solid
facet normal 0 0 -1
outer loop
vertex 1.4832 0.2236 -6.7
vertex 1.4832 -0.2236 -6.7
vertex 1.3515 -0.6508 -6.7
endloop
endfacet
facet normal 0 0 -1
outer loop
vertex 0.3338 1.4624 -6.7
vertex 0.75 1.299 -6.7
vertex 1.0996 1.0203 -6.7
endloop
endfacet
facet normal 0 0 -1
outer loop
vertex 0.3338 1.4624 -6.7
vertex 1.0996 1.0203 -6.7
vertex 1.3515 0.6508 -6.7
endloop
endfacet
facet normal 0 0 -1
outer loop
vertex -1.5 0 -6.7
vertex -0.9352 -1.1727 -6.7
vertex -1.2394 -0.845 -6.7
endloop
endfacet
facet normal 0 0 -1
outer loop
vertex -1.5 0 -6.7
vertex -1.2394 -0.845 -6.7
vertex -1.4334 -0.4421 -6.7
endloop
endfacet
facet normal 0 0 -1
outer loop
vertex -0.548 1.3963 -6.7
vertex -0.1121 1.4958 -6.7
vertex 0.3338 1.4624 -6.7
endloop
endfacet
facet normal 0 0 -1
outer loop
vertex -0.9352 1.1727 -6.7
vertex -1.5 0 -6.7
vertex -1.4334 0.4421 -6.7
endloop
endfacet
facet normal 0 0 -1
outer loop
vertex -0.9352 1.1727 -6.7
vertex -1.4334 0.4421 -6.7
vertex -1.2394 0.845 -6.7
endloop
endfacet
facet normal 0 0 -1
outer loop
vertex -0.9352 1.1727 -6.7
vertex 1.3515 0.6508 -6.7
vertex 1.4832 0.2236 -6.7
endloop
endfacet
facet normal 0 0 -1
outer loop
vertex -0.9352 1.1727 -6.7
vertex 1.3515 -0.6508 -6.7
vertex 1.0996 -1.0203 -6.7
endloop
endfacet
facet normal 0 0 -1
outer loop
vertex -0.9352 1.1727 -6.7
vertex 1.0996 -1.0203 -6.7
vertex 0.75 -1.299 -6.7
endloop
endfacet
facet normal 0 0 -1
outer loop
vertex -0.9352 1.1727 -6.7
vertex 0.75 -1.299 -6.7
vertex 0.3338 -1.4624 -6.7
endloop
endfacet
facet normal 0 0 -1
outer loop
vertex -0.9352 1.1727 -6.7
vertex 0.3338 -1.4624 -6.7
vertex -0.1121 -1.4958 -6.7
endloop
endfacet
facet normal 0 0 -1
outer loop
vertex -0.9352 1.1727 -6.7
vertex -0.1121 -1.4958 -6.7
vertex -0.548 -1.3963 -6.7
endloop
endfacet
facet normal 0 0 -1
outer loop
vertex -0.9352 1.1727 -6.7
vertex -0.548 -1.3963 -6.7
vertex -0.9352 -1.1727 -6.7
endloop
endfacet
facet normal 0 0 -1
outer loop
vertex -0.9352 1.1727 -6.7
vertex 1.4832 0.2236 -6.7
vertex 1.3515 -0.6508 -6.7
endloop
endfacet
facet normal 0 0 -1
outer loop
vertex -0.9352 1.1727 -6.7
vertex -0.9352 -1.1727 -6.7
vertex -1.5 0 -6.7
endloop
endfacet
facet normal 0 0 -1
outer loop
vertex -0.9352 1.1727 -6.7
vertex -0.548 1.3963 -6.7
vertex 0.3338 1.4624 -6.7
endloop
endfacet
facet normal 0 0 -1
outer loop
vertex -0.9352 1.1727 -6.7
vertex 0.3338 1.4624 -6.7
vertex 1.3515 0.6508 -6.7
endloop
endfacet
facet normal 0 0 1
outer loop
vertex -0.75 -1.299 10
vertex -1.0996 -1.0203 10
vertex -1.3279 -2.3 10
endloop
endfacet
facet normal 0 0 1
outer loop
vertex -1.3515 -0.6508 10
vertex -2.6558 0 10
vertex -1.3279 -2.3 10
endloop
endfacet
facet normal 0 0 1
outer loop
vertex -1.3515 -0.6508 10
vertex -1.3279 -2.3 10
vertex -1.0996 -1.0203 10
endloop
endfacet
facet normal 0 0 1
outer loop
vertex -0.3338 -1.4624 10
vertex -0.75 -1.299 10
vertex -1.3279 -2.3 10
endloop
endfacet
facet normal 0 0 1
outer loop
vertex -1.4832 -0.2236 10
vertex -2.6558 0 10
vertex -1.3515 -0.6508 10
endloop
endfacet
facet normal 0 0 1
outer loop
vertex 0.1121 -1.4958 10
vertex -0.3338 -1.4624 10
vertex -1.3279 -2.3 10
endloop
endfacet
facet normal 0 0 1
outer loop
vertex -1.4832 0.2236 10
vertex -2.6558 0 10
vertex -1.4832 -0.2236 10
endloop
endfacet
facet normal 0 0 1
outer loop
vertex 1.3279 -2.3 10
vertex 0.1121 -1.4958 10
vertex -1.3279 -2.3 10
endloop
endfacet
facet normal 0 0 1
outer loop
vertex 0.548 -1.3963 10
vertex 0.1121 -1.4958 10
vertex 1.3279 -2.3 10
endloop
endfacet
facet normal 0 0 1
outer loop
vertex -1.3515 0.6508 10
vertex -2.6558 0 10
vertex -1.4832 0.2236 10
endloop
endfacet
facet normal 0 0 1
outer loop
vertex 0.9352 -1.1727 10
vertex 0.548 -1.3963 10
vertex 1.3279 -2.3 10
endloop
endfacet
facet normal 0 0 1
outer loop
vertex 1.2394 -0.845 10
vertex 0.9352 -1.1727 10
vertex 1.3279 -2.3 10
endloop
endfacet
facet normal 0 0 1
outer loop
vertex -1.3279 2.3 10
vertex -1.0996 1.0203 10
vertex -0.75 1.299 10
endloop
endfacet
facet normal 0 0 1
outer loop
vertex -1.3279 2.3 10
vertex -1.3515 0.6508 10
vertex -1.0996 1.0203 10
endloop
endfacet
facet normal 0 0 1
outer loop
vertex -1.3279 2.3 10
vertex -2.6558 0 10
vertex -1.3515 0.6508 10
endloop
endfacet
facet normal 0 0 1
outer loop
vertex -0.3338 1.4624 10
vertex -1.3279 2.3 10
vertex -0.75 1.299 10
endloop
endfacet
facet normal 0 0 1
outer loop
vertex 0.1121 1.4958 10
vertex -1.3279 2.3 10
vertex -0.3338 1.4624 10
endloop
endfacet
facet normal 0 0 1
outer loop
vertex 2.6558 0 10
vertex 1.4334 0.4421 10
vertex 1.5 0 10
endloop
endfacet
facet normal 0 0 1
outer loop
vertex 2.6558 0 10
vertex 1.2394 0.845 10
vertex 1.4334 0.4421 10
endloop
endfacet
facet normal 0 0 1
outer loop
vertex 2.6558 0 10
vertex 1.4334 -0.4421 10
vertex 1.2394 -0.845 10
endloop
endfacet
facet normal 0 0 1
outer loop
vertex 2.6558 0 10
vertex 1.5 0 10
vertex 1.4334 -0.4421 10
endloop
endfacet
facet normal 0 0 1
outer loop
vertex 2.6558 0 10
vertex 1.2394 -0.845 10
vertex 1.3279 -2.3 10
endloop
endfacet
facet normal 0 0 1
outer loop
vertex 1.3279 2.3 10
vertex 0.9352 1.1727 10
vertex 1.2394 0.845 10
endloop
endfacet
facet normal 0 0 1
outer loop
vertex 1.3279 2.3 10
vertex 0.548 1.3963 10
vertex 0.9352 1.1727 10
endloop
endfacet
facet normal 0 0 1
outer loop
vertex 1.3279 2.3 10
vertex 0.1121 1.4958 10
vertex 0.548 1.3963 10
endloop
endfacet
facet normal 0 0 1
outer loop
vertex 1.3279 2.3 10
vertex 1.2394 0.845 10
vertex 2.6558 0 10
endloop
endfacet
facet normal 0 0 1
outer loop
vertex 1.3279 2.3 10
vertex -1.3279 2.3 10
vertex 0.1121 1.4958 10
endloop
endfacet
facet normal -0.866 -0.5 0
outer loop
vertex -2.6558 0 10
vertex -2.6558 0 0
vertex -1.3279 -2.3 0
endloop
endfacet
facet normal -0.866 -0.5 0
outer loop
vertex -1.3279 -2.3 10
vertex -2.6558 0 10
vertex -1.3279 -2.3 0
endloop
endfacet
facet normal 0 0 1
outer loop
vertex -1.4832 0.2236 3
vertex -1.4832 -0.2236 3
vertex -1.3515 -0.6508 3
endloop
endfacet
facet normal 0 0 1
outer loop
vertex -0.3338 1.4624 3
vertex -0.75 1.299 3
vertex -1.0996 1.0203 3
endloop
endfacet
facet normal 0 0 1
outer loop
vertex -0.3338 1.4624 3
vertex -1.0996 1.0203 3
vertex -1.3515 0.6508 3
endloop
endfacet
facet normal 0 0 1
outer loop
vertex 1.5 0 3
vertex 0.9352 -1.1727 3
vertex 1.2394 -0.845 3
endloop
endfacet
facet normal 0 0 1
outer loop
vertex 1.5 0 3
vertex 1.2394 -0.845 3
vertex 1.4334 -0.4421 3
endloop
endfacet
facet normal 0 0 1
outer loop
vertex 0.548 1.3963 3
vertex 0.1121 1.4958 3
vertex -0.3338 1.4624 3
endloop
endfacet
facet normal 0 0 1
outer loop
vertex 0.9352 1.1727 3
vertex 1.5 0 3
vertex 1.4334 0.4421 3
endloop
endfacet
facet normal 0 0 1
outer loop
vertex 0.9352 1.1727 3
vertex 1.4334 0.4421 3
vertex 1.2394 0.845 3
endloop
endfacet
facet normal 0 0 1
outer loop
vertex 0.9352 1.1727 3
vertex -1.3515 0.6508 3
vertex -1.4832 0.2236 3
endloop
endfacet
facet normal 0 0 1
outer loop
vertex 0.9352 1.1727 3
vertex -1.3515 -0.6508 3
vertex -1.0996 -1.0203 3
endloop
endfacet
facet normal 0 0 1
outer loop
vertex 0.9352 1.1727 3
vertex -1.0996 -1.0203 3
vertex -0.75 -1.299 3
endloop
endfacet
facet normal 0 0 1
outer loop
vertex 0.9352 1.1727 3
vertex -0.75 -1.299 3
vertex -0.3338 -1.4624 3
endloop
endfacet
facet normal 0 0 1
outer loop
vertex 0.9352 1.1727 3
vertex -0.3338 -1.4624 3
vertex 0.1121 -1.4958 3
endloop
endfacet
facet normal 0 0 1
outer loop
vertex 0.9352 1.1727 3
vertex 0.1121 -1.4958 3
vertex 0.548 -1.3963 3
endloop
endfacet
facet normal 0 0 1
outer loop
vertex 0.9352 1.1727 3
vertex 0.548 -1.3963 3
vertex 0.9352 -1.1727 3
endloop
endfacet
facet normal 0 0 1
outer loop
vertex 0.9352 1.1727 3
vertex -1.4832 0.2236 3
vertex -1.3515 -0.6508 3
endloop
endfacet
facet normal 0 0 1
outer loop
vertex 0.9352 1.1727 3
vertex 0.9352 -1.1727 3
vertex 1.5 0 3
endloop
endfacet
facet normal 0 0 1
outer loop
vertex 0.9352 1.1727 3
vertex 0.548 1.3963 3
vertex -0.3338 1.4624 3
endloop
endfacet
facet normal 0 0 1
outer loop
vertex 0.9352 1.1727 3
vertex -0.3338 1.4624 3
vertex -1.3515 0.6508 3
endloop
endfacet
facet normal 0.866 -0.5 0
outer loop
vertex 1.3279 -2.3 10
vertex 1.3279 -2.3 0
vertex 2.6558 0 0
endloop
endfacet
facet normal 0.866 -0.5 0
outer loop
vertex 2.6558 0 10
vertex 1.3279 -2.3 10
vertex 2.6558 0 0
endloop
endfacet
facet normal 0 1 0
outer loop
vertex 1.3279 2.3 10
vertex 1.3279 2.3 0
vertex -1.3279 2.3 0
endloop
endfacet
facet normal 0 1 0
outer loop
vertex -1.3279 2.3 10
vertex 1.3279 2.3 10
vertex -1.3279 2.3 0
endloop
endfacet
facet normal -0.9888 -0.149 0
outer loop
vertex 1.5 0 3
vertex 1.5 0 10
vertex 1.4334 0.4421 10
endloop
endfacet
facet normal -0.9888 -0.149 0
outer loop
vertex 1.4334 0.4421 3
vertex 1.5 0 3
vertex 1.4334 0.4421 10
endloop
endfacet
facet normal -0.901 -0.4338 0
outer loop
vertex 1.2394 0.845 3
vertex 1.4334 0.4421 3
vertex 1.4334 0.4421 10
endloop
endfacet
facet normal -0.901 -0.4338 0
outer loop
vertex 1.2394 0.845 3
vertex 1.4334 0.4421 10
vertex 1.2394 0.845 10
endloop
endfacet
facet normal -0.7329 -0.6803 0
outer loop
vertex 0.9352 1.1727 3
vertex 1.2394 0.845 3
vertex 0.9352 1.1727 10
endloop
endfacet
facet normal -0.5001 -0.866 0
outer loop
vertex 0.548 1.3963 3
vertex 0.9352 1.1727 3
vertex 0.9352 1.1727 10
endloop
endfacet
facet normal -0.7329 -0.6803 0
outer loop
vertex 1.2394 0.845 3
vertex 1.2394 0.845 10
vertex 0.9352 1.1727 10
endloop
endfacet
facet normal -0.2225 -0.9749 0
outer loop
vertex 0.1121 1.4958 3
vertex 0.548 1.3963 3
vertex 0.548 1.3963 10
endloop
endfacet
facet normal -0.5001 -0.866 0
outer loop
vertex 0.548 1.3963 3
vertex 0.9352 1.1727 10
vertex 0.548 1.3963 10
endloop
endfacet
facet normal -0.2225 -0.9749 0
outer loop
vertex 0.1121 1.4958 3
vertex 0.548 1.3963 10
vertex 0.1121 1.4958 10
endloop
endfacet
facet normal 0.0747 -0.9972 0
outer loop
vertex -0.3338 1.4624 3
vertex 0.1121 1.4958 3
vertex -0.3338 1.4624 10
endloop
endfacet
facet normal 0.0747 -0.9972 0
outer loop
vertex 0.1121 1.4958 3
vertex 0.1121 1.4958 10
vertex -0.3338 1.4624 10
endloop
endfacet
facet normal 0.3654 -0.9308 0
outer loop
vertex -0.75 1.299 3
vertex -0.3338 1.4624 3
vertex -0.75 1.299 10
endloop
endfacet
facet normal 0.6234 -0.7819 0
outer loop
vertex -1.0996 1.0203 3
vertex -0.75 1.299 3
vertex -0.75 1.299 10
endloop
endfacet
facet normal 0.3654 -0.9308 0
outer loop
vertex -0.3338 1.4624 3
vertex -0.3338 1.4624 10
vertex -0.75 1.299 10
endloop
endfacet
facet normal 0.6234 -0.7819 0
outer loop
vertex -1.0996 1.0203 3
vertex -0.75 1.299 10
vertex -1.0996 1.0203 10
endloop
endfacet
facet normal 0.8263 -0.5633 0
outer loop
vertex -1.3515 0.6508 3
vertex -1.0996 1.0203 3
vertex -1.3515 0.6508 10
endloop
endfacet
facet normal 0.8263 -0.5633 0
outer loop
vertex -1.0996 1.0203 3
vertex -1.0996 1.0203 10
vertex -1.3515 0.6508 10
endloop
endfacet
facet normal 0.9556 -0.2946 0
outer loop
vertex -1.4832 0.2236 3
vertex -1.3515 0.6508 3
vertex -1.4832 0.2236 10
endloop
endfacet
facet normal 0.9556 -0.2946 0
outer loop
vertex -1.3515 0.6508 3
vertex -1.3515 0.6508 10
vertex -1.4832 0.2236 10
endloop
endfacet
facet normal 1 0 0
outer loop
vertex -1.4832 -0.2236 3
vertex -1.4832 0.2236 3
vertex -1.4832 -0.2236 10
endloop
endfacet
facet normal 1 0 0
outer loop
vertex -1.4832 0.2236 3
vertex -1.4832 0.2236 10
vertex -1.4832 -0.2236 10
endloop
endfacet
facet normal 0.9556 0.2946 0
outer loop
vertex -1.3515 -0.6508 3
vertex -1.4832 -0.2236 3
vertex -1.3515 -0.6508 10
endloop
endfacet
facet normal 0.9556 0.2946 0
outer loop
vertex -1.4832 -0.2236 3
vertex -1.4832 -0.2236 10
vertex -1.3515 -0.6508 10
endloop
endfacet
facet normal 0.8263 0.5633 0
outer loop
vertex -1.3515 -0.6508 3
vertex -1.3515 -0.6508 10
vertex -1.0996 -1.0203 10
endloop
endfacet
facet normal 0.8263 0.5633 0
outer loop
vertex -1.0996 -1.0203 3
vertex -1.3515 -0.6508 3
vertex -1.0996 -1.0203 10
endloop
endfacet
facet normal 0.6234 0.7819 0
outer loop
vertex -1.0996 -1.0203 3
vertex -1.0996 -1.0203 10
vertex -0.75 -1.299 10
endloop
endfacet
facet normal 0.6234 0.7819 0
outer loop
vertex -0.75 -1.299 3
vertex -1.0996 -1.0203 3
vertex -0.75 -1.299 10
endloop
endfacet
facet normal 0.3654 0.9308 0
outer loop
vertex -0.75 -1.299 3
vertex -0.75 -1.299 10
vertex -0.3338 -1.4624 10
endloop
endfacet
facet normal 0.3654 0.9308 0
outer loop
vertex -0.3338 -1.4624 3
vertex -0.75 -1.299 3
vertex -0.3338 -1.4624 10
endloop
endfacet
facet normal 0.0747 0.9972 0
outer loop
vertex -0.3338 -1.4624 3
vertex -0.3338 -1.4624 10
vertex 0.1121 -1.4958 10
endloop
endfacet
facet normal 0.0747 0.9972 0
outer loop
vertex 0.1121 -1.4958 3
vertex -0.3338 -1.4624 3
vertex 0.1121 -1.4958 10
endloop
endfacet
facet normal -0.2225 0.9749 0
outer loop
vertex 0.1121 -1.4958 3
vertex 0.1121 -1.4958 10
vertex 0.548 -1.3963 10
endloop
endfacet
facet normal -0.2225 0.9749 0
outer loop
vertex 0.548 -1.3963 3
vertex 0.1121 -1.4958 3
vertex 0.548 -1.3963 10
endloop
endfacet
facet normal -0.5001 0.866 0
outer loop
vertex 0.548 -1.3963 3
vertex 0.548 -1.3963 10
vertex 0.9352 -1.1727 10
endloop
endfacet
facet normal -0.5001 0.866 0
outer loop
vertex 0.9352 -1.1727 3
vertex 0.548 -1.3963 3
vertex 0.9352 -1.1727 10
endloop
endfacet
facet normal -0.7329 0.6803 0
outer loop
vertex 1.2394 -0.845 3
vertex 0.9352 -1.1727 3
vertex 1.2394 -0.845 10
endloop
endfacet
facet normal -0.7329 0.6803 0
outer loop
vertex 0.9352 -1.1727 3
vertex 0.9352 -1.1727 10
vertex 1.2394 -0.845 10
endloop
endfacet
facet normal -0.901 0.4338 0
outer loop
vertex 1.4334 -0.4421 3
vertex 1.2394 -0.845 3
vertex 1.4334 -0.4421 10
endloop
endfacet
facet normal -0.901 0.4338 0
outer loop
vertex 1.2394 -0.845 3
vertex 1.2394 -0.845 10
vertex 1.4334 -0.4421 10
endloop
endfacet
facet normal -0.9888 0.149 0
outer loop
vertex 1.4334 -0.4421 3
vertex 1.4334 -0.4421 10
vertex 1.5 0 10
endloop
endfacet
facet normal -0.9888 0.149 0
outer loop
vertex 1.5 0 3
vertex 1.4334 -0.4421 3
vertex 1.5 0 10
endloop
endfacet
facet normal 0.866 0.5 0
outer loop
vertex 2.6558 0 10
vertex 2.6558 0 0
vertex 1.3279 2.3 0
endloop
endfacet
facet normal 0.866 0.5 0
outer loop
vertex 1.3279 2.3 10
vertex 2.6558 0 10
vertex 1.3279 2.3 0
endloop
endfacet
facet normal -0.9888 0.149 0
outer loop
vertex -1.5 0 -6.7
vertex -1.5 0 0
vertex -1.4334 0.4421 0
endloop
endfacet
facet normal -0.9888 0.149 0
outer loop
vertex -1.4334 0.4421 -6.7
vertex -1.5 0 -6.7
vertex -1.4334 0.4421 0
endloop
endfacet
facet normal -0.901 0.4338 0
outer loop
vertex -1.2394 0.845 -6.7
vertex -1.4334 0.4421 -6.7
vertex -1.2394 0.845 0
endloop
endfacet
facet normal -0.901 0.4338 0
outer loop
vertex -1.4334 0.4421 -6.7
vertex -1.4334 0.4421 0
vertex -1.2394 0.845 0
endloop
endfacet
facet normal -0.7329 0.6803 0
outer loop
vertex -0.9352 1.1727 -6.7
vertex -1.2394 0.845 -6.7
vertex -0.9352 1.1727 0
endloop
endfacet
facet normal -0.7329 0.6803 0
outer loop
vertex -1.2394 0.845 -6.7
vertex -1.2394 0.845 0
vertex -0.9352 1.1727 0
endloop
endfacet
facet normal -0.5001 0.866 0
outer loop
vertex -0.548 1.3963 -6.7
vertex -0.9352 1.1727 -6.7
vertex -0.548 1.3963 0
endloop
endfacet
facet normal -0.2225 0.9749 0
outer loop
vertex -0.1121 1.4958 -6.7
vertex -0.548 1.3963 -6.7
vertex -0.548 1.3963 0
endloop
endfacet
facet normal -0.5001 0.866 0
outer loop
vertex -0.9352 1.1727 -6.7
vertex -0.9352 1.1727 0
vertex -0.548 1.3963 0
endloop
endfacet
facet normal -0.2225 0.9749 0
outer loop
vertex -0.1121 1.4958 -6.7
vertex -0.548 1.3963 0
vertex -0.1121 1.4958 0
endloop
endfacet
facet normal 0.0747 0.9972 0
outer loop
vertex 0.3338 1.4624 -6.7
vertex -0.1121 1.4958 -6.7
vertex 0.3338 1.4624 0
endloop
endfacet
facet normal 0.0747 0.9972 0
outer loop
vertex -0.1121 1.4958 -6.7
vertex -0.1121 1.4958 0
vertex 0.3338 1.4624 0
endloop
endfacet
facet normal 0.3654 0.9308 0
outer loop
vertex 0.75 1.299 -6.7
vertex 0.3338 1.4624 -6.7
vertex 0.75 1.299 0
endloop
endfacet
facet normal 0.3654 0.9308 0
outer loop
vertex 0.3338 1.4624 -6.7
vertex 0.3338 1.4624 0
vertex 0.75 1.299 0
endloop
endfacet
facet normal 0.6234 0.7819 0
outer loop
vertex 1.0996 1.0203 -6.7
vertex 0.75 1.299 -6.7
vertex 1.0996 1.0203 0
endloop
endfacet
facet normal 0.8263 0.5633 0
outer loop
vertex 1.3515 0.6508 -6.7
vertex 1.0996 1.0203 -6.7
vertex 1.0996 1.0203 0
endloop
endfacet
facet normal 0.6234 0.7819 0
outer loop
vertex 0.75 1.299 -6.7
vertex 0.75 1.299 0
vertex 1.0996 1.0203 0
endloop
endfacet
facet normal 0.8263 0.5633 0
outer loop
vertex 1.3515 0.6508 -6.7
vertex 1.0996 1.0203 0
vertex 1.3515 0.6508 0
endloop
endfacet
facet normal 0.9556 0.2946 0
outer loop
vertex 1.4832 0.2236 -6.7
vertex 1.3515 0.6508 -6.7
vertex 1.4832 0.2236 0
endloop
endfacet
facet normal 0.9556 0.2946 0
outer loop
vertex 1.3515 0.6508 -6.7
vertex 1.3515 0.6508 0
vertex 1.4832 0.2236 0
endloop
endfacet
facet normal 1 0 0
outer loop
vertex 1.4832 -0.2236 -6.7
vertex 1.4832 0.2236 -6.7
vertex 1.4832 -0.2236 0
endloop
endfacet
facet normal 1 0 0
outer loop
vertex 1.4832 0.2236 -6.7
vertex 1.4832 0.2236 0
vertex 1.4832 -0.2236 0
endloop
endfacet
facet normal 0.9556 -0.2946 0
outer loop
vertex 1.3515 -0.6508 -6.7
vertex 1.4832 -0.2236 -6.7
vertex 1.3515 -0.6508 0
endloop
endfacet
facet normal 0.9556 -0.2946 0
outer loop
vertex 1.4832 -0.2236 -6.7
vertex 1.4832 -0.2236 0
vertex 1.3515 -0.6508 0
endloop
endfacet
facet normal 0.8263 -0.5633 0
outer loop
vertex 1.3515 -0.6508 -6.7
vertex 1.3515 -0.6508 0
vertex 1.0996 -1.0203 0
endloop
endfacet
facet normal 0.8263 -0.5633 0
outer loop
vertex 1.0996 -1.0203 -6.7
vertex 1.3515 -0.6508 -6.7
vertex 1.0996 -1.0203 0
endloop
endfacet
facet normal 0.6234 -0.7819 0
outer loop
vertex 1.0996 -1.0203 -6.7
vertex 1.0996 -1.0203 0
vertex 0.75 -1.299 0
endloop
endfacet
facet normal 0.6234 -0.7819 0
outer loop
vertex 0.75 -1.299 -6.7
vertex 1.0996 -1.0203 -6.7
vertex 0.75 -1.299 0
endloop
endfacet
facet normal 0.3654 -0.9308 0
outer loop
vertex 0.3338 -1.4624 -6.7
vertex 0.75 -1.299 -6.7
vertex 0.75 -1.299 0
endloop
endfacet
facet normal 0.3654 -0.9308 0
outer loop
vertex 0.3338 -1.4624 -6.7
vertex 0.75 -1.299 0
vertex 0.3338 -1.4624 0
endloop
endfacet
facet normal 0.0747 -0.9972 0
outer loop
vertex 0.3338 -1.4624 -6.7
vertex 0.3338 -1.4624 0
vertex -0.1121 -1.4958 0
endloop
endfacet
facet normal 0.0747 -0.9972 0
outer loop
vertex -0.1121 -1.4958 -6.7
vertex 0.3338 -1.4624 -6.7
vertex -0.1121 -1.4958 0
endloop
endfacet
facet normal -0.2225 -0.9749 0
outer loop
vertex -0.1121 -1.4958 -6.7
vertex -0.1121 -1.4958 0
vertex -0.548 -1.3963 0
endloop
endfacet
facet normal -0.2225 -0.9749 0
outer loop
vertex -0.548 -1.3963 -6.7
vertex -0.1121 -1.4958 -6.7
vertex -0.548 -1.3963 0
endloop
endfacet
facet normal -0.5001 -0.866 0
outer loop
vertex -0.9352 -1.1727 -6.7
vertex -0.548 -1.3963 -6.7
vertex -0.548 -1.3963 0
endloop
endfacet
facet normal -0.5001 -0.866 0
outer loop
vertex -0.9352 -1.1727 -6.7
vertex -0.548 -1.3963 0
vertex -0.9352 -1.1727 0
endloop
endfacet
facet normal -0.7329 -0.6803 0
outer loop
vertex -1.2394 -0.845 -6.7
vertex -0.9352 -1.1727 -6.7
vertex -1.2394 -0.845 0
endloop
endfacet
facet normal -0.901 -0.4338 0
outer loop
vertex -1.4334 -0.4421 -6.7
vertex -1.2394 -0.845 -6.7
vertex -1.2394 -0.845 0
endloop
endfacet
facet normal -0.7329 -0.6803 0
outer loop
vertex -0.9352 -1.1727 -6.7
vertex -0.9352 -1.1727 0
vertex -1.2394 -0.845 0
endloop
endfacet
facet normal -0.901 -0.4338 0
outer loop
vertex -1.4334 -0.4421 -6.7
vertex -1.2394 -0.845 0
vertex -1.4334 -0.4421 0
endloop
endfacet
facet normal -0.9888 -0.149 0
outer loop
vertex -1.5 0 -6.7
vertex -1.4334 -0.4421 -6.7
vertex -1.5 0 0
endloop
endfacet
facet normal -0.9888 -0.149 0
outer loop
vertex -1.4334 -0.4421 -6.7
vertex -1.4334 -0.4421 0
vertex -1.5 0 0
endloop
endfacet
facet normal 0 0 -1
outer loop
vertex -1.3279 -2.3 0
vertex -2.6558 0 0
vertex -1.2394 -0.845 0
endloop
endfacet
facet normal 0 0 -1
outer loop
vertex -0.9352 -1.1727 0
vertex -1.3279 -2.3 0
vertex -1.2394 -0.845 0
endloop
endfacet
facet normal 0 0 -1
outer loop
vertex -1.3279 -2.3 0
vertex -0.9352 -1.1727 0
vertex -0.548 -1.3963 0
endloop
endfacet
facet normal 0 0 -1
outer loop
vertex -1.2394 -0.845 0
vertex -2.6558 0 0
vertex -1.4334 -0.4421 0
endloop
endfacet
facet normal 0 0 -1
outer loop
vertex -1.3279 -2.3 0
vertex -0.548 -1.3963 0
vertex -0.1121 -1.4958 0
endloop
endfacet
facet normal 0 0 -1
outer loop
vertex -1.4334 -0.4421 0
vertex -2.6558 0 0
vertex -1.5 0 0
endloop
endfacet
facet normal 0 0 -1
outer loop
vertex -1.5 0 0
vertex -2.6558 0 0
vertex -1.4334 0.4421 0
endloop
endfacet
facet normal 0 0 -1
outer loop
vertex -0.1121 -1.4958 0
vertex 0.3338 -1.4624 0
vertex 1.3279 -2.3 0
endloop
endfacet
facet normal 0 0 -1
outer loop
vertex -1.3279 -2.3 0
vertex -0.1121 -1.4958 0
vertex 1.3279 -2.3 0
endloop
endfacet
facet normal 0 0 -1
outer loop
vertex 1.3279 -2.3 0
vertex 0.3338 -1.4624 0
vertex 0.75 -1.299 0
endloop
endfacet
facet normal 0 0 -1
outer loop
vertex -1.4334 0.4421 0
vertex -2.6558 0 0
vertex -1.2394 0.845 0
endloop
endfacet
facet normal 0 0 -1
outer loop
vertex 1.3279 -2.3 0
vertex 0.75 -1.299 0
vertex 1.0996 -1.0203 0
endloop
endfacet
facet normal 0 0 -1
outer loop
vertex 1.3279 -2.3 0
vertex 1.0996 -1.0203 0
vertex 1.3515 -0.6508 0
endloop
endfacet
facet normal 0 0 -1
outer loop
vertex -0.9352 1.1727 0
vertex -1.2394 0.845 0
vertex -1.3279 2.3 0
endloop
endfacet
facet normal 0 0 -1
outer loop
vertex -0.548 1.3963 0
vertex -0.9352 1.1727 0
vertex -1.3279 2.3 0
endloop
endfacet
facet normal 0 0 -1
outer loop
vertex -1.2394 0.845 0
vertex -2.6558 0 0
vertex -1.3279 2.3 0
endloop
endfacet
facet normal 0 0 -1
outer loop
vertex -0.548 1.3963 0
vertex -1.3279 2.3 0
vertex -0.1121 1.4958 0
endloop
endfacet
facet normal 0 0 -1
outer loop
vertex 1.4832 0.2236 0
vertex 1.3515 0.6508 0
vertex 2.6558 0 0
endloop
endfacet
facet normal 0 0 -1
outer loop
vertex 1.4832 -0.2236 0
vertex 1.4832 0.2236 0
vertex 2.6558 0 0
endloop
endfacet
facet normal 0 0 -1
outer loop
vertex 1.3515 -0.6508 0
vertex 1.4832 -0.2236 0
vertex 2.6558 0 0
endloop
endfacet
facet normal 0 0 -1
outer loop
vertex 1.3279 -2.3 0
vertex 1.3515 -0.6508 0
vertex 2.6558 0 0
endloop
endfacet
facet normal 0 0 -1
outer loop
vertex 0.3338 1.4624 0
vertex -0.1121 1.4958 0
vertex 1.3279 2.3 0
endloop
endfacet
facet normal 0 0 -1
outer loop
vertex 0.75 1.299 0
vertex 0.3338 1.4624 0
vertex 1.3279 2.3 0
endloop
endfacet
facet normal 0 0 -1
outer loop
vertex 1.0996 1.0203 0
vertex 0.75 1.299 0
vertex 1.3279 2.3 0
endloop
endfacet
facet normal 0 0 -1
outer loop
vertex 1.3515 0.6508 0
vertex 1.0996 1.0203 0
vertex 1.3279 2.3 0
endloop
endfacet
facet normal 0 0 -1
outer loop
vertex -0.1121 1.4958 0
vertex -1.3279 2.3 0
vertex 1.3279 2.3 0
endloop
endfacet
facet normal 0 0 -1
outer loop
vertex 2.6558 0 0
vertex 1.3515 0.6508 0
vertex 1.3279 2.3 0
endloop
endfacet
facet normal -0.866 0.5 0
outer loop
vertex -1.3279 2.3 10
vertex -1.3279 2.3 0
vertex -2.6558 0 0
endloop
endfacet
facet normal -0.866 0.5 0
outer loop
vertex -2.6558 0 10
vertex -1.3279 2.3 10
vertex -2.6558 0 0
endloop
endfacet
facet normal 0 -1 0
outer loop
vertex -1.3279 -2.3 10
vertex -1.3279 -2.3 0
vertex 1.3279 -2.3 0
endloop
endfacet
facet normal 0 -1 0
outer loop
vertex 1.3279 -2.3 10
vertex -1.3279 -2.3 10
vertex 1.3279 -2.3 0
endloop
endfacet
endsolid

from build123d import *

# Parameters (mm, degrees)
SALIENTE_EXTRUIR1_DEPTH = 10
CROQUIS2_R              = 1.5
SALIENTE_EXTRUIR2_DEPTH = 6.7
CROQUIS3_R              = 1.5
CORTAR_EXTRUIR1_DEPTH   = 7


with BuildPart() as part:
    # Croquis1 → Saliente-Extruir1 (new body)
    with BuildSketch(Plane.XY):
        Polygon((2.655811238, 0), (1.327905619, 2.3), (-1.327905619, 2.3), (-2.655811238, 0), (-1.327905619, -2.3), (1.327905619, -2.3), align=None)
    extrude(amount=SALIENTE_EXTRUIR1_DEPTH)

    # Croquis2 → Saliente-Extruir2 (add)
    with BuildSketch(Plane(origin=(0, 0, 0), x_dir=(-1, 0, 0), z_dir=(0, 0, -1))):
        Circle(CROQUIS2_R)
    extrude(amount=SALIENTE_EXTRUIR2_DEPTH)

    # Croquis3 → Cortar-Extruir1 (cut)
    with BuildSketch(Plane.XY.offset(10)):
        Circle(CROQUIS3_R)
    extrude(amount=-CORTAR_EXTRUIR1_DEPTH, mode=Mode.SUBTRACT)


solid = part.part
